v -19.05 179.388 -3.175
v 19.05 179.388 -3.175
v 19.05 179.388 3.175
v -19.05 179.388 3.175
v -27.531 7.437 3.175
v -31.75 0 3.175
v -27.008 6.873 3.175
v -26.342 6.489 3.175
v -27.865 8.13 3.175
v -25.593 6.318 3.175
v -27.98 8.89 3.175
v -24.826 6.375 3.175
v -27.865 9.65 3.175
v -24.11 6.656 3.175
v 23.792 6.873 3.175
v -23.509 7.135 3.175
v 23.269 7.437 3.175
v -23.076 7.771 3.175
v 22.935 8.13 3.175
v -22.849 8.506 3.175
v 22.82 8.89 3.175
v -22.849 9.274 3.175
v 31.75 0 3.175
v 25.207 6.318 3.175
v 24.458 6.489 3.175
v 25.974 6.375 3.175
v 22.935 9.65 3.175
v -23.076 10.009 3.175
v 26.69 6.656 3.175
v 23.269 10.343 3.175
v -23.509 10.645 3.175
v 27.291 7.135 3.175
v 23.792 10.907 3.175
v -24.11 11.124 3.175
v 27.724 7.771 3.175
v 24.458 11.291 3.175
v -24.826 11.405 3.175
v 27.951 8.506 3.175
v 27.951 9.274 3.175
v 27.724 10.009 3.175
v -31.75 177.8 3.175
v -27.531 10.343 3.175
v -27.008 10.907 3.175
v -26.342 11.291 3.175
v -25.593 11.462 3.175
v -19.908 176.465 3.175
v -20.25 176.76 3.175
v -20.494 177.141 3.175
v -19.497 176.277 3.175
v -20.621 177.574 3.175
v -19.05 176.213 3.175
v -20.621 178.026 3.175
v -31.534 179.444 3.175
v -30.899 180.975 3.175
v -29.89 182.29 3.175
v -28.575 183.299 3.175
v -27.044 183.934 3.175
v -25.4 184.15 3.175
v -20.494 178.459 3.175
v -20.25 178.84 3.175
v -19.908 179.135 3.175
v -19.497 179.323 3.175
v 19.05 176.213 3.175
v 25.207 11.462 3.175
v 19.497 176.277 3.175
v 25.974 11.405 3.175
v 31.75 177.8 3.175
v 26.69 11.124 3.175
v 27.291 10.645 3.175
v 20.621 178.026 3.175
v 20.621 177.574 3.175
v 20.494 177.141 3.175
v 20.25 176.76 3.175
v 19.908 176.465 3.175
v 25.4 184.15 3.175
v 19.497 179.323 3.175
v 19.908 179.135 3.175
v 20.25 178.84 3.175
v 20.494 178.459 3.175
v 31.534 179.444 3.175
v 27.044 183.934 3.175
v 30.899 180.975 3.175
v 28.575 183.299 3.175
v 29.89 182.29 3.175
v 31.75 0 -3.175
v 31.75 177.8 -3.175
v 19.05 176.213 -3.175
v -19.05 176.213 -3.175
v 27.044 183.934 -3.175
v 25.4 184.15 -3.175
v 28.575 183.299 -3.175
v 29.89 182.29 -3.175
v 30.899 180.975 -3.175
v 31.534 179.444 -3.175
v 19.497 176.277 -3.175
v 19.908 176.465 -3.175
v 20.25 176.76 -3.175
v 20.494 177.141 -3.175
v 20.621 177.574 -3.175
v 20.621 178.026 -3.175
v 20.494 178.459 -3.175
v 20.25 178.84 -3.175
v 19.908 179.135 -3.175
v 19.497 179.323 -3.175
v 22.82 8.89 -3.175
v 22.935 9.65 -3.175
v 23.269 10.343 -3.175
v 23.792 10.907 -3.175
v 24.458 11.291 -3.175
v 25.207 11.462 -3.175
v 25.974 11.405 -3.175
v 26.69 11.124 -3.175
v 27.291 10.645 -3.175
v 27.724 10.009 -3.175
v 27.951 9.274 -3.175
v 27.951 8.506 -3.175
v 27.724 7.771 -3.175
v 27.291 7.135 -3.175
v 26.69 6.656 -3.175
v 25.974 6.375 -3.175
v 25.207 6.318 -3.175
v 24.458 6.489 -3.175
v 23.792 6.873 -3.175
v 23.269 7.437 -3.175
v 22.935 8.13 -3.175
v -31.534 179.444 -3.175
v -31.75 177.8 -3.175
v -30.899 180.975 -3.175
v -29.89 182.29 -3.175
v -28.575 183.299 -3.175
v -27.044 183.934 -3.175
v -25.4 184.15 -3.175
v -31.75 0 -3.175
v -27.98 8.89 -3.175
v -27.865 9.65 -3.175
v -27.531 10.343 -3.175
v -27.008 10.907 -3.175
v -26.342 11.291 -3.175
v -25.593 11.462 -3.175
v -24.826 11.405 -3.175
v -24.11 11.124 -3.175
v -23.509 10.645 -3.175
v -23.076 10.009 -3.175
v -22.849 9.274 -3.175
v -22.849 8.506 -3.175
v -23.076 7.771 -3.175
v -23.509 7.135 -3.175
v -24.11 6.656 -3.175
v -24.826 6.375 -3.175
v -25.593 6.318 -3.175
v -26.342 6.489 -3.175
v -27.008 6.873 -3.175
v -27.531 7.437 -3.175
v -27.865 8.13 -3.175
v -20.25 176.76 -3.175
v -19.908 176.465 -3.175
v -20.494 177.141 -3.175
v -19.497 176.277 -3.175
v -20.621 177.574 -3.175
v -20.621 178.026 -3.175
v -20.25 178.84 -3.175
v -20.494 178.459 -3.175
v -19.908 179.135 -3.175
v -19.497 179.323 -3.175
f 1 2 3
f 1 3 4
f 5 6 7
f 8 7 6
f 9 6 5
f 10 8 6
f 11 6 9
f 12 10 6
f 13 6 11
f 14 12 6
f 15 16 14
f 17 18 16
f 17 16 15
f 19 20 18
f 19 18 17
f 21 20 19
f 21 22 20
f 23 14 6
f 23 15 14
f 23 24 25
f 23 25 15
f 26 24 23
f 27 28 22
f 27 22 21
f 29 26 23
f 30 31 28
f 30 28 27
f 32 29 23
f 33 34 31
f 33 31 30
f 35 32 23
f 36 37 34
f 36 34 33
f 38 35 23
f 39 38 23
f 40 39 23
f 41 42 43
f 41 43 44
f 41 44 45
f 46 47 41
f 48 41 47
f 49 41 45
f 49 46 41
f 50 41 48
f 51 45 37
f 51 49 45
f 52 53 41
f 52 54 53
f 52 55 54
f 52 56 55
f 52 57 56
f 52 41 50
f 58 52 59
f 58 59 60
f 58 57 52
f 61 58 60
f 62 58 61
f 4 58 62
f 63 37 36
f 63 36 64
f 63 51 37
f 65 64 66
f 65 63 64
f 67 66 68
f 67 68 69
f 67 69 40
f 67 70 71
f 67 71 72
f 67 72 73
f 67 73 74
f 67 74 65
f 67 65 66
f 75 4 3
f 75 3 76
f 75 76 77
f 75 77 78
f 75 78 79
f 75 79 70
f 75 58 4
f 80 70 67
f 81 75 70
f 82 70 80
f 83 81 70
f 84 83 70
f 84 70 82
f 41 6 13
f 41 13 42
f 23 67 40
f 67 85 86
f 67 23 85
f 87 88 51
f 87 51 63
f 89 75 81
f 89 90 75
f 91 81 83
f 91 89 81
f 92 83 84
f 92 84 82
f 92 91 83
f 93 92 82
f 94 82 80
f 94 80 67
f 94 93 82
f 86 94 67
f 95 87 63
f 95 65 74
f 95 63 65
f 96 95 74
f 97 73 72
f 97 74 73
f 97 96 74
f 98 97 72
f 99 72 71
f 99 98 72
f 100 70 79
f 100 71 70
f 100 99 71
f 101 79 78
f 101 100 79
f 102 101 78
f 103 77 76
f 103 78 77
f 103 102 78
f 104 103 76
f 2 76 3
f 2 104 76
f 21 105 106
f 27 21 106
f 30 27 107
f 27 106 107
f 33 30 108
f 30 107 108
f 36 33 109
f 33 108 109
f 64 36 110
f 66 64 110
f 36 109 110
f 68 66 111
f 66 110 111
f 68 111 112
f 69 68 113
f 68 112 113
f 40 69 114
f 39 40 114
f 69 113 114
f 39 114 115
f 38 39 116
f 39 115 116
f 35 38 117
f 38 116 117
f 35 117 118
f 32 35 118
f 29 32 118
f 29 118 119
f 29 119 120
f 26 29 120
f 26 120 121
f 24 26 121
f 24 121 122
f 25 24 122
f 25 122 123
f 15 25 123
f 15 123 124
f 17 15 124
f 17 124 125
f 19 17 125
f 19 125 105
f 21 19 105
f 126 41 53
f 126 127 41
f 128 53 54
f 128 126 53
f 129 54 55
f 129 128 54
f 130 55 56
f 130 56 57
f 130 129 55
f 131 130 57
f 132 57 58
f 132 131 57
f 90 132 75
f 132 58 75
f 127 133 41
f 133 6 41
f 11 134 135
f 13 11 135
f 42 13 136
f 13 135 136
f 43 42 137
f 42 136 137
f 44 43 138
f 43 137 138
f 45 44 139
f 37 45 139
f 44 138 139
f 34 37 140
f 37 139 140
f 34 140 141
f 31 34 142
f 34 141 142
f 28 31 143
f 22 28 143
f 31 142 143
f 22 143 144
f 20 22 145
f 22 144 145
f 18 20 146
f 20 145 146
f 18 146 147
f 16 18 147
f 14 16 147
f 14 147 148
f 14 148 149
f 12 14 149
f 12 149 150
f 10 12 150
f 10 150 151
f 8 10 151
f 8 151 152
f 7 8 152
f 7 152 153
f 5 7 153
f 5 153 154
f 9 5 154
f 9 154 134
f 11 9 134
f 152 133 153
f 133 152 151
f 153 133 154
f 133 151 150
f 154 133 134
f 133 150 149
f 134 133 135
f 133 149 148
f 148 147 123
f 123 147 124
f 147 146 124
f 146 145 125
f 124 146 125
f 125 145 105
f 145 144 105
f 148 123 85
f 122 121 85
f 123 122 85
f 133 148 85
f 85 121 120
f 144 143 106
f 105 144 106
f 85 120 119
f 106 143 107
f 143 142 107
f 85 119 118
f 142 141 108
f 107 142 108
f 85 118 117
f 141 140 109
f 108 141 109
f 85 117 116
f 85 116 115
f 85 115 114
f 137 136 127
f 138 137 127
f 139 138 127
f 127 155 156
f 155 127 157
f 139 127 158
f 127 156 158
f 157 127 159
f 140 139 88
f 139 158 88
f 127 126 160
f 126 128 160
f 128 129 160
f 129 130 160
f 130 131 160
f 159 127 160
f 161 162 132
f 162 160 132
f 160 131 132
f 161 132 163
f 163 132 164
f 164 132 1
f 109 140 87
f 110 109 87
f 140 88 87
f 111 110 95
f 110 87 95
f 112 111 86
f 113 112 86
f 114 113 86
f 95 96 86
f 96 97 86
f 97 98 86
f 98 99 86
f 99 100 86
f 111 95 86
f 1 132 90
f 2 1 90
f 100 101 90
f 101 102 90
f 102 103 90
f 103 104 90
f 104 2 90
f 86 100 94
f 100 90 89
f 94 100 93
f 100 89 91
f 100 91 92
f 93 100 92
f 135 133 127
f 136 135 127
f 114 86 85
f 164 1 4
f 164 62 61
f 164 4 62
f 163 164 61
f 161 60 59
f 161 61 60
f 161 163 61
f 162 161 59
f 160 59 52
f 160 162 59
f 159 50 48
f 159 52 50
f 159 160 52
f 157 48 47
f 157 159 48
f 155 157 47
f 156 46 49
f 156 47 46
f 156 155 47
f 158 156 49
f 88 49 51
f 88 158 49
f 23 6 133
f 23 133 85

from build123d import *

# Parameters (mm, degrees)
SKETCH1_W           = 63.5
SKETCH1_H           = 184.15
BOSS_EXTRUDE1_DEPTH = 3.175
SKETCH3_R           = 2.5796875
CUT_EXTRUDE2_DEPTH  = 187.974884677
CUT_EXTRUDE3_DEPTH  = 187.974884677
FILLET1_R           = 6.35


with BuildPart() as part:
    # Sketch1 → Boss-Extrude1 (new, symmetric)
    with BuildSketch(Plane.XY):
        with Locations((0, 92.075)):
            Rectangle(SKETCH1_W, SKETCH1_H)
    extrude(amount=BOSS_EXTRUDE1_DEPTH, both=True)

    # Sketch3 → Cut-Extrude2 (cut, through all)
    with BuildSketch(Plane(origin=(0, 0, -3.175), x_dir=(-1, 0, 0), z_dir=(0, 0, -1))):
        with Locations((-25.4, 8.89)):
            Circle(SKETCH3_R)
        with Locations((25.4, 8.89)):
            Circle(SKETCH3_R)
    extrude(amount=-CUT_EXTRUDE2_DEPTH, mode=Mode.SUBTRACT)

    # Sketch4 → Cut-Extrude3 (cut, through all)
    with BuildSketch(Plane(origin=(0, 0, -3.175), x_dir=(-1, 0, 0), z_dir=(0, 0, -1))):
        with BuildLine():
            Line((-19.05, 179.3875), (19.05, 179.3875))
            ThreePointArc((19.05, 179.3875), (20.6375, 177.8), (19.05, 176.2125))
            Line((19.05, 176.2125), (-19.05, 176.2125))
            ThreePointArc((-19.05, 176.2125), (-20.6375, 177.8), (-19.05, 179.3875))
        make_face()
    extrude(amount=-CUT_EXTRUDE3_DEPTH, mode=Mode.SUBTRACT)

    # Fillet1
    fillet1_edges = [part.edges().sort_by_distance(p)[0] for p in [
        (-31.75, 184.15, 0),
        (31.75, 184.15, 0),
    ]]
    fillet(fillet1_edges, radius=FILLET1_R)


solid = part.part
